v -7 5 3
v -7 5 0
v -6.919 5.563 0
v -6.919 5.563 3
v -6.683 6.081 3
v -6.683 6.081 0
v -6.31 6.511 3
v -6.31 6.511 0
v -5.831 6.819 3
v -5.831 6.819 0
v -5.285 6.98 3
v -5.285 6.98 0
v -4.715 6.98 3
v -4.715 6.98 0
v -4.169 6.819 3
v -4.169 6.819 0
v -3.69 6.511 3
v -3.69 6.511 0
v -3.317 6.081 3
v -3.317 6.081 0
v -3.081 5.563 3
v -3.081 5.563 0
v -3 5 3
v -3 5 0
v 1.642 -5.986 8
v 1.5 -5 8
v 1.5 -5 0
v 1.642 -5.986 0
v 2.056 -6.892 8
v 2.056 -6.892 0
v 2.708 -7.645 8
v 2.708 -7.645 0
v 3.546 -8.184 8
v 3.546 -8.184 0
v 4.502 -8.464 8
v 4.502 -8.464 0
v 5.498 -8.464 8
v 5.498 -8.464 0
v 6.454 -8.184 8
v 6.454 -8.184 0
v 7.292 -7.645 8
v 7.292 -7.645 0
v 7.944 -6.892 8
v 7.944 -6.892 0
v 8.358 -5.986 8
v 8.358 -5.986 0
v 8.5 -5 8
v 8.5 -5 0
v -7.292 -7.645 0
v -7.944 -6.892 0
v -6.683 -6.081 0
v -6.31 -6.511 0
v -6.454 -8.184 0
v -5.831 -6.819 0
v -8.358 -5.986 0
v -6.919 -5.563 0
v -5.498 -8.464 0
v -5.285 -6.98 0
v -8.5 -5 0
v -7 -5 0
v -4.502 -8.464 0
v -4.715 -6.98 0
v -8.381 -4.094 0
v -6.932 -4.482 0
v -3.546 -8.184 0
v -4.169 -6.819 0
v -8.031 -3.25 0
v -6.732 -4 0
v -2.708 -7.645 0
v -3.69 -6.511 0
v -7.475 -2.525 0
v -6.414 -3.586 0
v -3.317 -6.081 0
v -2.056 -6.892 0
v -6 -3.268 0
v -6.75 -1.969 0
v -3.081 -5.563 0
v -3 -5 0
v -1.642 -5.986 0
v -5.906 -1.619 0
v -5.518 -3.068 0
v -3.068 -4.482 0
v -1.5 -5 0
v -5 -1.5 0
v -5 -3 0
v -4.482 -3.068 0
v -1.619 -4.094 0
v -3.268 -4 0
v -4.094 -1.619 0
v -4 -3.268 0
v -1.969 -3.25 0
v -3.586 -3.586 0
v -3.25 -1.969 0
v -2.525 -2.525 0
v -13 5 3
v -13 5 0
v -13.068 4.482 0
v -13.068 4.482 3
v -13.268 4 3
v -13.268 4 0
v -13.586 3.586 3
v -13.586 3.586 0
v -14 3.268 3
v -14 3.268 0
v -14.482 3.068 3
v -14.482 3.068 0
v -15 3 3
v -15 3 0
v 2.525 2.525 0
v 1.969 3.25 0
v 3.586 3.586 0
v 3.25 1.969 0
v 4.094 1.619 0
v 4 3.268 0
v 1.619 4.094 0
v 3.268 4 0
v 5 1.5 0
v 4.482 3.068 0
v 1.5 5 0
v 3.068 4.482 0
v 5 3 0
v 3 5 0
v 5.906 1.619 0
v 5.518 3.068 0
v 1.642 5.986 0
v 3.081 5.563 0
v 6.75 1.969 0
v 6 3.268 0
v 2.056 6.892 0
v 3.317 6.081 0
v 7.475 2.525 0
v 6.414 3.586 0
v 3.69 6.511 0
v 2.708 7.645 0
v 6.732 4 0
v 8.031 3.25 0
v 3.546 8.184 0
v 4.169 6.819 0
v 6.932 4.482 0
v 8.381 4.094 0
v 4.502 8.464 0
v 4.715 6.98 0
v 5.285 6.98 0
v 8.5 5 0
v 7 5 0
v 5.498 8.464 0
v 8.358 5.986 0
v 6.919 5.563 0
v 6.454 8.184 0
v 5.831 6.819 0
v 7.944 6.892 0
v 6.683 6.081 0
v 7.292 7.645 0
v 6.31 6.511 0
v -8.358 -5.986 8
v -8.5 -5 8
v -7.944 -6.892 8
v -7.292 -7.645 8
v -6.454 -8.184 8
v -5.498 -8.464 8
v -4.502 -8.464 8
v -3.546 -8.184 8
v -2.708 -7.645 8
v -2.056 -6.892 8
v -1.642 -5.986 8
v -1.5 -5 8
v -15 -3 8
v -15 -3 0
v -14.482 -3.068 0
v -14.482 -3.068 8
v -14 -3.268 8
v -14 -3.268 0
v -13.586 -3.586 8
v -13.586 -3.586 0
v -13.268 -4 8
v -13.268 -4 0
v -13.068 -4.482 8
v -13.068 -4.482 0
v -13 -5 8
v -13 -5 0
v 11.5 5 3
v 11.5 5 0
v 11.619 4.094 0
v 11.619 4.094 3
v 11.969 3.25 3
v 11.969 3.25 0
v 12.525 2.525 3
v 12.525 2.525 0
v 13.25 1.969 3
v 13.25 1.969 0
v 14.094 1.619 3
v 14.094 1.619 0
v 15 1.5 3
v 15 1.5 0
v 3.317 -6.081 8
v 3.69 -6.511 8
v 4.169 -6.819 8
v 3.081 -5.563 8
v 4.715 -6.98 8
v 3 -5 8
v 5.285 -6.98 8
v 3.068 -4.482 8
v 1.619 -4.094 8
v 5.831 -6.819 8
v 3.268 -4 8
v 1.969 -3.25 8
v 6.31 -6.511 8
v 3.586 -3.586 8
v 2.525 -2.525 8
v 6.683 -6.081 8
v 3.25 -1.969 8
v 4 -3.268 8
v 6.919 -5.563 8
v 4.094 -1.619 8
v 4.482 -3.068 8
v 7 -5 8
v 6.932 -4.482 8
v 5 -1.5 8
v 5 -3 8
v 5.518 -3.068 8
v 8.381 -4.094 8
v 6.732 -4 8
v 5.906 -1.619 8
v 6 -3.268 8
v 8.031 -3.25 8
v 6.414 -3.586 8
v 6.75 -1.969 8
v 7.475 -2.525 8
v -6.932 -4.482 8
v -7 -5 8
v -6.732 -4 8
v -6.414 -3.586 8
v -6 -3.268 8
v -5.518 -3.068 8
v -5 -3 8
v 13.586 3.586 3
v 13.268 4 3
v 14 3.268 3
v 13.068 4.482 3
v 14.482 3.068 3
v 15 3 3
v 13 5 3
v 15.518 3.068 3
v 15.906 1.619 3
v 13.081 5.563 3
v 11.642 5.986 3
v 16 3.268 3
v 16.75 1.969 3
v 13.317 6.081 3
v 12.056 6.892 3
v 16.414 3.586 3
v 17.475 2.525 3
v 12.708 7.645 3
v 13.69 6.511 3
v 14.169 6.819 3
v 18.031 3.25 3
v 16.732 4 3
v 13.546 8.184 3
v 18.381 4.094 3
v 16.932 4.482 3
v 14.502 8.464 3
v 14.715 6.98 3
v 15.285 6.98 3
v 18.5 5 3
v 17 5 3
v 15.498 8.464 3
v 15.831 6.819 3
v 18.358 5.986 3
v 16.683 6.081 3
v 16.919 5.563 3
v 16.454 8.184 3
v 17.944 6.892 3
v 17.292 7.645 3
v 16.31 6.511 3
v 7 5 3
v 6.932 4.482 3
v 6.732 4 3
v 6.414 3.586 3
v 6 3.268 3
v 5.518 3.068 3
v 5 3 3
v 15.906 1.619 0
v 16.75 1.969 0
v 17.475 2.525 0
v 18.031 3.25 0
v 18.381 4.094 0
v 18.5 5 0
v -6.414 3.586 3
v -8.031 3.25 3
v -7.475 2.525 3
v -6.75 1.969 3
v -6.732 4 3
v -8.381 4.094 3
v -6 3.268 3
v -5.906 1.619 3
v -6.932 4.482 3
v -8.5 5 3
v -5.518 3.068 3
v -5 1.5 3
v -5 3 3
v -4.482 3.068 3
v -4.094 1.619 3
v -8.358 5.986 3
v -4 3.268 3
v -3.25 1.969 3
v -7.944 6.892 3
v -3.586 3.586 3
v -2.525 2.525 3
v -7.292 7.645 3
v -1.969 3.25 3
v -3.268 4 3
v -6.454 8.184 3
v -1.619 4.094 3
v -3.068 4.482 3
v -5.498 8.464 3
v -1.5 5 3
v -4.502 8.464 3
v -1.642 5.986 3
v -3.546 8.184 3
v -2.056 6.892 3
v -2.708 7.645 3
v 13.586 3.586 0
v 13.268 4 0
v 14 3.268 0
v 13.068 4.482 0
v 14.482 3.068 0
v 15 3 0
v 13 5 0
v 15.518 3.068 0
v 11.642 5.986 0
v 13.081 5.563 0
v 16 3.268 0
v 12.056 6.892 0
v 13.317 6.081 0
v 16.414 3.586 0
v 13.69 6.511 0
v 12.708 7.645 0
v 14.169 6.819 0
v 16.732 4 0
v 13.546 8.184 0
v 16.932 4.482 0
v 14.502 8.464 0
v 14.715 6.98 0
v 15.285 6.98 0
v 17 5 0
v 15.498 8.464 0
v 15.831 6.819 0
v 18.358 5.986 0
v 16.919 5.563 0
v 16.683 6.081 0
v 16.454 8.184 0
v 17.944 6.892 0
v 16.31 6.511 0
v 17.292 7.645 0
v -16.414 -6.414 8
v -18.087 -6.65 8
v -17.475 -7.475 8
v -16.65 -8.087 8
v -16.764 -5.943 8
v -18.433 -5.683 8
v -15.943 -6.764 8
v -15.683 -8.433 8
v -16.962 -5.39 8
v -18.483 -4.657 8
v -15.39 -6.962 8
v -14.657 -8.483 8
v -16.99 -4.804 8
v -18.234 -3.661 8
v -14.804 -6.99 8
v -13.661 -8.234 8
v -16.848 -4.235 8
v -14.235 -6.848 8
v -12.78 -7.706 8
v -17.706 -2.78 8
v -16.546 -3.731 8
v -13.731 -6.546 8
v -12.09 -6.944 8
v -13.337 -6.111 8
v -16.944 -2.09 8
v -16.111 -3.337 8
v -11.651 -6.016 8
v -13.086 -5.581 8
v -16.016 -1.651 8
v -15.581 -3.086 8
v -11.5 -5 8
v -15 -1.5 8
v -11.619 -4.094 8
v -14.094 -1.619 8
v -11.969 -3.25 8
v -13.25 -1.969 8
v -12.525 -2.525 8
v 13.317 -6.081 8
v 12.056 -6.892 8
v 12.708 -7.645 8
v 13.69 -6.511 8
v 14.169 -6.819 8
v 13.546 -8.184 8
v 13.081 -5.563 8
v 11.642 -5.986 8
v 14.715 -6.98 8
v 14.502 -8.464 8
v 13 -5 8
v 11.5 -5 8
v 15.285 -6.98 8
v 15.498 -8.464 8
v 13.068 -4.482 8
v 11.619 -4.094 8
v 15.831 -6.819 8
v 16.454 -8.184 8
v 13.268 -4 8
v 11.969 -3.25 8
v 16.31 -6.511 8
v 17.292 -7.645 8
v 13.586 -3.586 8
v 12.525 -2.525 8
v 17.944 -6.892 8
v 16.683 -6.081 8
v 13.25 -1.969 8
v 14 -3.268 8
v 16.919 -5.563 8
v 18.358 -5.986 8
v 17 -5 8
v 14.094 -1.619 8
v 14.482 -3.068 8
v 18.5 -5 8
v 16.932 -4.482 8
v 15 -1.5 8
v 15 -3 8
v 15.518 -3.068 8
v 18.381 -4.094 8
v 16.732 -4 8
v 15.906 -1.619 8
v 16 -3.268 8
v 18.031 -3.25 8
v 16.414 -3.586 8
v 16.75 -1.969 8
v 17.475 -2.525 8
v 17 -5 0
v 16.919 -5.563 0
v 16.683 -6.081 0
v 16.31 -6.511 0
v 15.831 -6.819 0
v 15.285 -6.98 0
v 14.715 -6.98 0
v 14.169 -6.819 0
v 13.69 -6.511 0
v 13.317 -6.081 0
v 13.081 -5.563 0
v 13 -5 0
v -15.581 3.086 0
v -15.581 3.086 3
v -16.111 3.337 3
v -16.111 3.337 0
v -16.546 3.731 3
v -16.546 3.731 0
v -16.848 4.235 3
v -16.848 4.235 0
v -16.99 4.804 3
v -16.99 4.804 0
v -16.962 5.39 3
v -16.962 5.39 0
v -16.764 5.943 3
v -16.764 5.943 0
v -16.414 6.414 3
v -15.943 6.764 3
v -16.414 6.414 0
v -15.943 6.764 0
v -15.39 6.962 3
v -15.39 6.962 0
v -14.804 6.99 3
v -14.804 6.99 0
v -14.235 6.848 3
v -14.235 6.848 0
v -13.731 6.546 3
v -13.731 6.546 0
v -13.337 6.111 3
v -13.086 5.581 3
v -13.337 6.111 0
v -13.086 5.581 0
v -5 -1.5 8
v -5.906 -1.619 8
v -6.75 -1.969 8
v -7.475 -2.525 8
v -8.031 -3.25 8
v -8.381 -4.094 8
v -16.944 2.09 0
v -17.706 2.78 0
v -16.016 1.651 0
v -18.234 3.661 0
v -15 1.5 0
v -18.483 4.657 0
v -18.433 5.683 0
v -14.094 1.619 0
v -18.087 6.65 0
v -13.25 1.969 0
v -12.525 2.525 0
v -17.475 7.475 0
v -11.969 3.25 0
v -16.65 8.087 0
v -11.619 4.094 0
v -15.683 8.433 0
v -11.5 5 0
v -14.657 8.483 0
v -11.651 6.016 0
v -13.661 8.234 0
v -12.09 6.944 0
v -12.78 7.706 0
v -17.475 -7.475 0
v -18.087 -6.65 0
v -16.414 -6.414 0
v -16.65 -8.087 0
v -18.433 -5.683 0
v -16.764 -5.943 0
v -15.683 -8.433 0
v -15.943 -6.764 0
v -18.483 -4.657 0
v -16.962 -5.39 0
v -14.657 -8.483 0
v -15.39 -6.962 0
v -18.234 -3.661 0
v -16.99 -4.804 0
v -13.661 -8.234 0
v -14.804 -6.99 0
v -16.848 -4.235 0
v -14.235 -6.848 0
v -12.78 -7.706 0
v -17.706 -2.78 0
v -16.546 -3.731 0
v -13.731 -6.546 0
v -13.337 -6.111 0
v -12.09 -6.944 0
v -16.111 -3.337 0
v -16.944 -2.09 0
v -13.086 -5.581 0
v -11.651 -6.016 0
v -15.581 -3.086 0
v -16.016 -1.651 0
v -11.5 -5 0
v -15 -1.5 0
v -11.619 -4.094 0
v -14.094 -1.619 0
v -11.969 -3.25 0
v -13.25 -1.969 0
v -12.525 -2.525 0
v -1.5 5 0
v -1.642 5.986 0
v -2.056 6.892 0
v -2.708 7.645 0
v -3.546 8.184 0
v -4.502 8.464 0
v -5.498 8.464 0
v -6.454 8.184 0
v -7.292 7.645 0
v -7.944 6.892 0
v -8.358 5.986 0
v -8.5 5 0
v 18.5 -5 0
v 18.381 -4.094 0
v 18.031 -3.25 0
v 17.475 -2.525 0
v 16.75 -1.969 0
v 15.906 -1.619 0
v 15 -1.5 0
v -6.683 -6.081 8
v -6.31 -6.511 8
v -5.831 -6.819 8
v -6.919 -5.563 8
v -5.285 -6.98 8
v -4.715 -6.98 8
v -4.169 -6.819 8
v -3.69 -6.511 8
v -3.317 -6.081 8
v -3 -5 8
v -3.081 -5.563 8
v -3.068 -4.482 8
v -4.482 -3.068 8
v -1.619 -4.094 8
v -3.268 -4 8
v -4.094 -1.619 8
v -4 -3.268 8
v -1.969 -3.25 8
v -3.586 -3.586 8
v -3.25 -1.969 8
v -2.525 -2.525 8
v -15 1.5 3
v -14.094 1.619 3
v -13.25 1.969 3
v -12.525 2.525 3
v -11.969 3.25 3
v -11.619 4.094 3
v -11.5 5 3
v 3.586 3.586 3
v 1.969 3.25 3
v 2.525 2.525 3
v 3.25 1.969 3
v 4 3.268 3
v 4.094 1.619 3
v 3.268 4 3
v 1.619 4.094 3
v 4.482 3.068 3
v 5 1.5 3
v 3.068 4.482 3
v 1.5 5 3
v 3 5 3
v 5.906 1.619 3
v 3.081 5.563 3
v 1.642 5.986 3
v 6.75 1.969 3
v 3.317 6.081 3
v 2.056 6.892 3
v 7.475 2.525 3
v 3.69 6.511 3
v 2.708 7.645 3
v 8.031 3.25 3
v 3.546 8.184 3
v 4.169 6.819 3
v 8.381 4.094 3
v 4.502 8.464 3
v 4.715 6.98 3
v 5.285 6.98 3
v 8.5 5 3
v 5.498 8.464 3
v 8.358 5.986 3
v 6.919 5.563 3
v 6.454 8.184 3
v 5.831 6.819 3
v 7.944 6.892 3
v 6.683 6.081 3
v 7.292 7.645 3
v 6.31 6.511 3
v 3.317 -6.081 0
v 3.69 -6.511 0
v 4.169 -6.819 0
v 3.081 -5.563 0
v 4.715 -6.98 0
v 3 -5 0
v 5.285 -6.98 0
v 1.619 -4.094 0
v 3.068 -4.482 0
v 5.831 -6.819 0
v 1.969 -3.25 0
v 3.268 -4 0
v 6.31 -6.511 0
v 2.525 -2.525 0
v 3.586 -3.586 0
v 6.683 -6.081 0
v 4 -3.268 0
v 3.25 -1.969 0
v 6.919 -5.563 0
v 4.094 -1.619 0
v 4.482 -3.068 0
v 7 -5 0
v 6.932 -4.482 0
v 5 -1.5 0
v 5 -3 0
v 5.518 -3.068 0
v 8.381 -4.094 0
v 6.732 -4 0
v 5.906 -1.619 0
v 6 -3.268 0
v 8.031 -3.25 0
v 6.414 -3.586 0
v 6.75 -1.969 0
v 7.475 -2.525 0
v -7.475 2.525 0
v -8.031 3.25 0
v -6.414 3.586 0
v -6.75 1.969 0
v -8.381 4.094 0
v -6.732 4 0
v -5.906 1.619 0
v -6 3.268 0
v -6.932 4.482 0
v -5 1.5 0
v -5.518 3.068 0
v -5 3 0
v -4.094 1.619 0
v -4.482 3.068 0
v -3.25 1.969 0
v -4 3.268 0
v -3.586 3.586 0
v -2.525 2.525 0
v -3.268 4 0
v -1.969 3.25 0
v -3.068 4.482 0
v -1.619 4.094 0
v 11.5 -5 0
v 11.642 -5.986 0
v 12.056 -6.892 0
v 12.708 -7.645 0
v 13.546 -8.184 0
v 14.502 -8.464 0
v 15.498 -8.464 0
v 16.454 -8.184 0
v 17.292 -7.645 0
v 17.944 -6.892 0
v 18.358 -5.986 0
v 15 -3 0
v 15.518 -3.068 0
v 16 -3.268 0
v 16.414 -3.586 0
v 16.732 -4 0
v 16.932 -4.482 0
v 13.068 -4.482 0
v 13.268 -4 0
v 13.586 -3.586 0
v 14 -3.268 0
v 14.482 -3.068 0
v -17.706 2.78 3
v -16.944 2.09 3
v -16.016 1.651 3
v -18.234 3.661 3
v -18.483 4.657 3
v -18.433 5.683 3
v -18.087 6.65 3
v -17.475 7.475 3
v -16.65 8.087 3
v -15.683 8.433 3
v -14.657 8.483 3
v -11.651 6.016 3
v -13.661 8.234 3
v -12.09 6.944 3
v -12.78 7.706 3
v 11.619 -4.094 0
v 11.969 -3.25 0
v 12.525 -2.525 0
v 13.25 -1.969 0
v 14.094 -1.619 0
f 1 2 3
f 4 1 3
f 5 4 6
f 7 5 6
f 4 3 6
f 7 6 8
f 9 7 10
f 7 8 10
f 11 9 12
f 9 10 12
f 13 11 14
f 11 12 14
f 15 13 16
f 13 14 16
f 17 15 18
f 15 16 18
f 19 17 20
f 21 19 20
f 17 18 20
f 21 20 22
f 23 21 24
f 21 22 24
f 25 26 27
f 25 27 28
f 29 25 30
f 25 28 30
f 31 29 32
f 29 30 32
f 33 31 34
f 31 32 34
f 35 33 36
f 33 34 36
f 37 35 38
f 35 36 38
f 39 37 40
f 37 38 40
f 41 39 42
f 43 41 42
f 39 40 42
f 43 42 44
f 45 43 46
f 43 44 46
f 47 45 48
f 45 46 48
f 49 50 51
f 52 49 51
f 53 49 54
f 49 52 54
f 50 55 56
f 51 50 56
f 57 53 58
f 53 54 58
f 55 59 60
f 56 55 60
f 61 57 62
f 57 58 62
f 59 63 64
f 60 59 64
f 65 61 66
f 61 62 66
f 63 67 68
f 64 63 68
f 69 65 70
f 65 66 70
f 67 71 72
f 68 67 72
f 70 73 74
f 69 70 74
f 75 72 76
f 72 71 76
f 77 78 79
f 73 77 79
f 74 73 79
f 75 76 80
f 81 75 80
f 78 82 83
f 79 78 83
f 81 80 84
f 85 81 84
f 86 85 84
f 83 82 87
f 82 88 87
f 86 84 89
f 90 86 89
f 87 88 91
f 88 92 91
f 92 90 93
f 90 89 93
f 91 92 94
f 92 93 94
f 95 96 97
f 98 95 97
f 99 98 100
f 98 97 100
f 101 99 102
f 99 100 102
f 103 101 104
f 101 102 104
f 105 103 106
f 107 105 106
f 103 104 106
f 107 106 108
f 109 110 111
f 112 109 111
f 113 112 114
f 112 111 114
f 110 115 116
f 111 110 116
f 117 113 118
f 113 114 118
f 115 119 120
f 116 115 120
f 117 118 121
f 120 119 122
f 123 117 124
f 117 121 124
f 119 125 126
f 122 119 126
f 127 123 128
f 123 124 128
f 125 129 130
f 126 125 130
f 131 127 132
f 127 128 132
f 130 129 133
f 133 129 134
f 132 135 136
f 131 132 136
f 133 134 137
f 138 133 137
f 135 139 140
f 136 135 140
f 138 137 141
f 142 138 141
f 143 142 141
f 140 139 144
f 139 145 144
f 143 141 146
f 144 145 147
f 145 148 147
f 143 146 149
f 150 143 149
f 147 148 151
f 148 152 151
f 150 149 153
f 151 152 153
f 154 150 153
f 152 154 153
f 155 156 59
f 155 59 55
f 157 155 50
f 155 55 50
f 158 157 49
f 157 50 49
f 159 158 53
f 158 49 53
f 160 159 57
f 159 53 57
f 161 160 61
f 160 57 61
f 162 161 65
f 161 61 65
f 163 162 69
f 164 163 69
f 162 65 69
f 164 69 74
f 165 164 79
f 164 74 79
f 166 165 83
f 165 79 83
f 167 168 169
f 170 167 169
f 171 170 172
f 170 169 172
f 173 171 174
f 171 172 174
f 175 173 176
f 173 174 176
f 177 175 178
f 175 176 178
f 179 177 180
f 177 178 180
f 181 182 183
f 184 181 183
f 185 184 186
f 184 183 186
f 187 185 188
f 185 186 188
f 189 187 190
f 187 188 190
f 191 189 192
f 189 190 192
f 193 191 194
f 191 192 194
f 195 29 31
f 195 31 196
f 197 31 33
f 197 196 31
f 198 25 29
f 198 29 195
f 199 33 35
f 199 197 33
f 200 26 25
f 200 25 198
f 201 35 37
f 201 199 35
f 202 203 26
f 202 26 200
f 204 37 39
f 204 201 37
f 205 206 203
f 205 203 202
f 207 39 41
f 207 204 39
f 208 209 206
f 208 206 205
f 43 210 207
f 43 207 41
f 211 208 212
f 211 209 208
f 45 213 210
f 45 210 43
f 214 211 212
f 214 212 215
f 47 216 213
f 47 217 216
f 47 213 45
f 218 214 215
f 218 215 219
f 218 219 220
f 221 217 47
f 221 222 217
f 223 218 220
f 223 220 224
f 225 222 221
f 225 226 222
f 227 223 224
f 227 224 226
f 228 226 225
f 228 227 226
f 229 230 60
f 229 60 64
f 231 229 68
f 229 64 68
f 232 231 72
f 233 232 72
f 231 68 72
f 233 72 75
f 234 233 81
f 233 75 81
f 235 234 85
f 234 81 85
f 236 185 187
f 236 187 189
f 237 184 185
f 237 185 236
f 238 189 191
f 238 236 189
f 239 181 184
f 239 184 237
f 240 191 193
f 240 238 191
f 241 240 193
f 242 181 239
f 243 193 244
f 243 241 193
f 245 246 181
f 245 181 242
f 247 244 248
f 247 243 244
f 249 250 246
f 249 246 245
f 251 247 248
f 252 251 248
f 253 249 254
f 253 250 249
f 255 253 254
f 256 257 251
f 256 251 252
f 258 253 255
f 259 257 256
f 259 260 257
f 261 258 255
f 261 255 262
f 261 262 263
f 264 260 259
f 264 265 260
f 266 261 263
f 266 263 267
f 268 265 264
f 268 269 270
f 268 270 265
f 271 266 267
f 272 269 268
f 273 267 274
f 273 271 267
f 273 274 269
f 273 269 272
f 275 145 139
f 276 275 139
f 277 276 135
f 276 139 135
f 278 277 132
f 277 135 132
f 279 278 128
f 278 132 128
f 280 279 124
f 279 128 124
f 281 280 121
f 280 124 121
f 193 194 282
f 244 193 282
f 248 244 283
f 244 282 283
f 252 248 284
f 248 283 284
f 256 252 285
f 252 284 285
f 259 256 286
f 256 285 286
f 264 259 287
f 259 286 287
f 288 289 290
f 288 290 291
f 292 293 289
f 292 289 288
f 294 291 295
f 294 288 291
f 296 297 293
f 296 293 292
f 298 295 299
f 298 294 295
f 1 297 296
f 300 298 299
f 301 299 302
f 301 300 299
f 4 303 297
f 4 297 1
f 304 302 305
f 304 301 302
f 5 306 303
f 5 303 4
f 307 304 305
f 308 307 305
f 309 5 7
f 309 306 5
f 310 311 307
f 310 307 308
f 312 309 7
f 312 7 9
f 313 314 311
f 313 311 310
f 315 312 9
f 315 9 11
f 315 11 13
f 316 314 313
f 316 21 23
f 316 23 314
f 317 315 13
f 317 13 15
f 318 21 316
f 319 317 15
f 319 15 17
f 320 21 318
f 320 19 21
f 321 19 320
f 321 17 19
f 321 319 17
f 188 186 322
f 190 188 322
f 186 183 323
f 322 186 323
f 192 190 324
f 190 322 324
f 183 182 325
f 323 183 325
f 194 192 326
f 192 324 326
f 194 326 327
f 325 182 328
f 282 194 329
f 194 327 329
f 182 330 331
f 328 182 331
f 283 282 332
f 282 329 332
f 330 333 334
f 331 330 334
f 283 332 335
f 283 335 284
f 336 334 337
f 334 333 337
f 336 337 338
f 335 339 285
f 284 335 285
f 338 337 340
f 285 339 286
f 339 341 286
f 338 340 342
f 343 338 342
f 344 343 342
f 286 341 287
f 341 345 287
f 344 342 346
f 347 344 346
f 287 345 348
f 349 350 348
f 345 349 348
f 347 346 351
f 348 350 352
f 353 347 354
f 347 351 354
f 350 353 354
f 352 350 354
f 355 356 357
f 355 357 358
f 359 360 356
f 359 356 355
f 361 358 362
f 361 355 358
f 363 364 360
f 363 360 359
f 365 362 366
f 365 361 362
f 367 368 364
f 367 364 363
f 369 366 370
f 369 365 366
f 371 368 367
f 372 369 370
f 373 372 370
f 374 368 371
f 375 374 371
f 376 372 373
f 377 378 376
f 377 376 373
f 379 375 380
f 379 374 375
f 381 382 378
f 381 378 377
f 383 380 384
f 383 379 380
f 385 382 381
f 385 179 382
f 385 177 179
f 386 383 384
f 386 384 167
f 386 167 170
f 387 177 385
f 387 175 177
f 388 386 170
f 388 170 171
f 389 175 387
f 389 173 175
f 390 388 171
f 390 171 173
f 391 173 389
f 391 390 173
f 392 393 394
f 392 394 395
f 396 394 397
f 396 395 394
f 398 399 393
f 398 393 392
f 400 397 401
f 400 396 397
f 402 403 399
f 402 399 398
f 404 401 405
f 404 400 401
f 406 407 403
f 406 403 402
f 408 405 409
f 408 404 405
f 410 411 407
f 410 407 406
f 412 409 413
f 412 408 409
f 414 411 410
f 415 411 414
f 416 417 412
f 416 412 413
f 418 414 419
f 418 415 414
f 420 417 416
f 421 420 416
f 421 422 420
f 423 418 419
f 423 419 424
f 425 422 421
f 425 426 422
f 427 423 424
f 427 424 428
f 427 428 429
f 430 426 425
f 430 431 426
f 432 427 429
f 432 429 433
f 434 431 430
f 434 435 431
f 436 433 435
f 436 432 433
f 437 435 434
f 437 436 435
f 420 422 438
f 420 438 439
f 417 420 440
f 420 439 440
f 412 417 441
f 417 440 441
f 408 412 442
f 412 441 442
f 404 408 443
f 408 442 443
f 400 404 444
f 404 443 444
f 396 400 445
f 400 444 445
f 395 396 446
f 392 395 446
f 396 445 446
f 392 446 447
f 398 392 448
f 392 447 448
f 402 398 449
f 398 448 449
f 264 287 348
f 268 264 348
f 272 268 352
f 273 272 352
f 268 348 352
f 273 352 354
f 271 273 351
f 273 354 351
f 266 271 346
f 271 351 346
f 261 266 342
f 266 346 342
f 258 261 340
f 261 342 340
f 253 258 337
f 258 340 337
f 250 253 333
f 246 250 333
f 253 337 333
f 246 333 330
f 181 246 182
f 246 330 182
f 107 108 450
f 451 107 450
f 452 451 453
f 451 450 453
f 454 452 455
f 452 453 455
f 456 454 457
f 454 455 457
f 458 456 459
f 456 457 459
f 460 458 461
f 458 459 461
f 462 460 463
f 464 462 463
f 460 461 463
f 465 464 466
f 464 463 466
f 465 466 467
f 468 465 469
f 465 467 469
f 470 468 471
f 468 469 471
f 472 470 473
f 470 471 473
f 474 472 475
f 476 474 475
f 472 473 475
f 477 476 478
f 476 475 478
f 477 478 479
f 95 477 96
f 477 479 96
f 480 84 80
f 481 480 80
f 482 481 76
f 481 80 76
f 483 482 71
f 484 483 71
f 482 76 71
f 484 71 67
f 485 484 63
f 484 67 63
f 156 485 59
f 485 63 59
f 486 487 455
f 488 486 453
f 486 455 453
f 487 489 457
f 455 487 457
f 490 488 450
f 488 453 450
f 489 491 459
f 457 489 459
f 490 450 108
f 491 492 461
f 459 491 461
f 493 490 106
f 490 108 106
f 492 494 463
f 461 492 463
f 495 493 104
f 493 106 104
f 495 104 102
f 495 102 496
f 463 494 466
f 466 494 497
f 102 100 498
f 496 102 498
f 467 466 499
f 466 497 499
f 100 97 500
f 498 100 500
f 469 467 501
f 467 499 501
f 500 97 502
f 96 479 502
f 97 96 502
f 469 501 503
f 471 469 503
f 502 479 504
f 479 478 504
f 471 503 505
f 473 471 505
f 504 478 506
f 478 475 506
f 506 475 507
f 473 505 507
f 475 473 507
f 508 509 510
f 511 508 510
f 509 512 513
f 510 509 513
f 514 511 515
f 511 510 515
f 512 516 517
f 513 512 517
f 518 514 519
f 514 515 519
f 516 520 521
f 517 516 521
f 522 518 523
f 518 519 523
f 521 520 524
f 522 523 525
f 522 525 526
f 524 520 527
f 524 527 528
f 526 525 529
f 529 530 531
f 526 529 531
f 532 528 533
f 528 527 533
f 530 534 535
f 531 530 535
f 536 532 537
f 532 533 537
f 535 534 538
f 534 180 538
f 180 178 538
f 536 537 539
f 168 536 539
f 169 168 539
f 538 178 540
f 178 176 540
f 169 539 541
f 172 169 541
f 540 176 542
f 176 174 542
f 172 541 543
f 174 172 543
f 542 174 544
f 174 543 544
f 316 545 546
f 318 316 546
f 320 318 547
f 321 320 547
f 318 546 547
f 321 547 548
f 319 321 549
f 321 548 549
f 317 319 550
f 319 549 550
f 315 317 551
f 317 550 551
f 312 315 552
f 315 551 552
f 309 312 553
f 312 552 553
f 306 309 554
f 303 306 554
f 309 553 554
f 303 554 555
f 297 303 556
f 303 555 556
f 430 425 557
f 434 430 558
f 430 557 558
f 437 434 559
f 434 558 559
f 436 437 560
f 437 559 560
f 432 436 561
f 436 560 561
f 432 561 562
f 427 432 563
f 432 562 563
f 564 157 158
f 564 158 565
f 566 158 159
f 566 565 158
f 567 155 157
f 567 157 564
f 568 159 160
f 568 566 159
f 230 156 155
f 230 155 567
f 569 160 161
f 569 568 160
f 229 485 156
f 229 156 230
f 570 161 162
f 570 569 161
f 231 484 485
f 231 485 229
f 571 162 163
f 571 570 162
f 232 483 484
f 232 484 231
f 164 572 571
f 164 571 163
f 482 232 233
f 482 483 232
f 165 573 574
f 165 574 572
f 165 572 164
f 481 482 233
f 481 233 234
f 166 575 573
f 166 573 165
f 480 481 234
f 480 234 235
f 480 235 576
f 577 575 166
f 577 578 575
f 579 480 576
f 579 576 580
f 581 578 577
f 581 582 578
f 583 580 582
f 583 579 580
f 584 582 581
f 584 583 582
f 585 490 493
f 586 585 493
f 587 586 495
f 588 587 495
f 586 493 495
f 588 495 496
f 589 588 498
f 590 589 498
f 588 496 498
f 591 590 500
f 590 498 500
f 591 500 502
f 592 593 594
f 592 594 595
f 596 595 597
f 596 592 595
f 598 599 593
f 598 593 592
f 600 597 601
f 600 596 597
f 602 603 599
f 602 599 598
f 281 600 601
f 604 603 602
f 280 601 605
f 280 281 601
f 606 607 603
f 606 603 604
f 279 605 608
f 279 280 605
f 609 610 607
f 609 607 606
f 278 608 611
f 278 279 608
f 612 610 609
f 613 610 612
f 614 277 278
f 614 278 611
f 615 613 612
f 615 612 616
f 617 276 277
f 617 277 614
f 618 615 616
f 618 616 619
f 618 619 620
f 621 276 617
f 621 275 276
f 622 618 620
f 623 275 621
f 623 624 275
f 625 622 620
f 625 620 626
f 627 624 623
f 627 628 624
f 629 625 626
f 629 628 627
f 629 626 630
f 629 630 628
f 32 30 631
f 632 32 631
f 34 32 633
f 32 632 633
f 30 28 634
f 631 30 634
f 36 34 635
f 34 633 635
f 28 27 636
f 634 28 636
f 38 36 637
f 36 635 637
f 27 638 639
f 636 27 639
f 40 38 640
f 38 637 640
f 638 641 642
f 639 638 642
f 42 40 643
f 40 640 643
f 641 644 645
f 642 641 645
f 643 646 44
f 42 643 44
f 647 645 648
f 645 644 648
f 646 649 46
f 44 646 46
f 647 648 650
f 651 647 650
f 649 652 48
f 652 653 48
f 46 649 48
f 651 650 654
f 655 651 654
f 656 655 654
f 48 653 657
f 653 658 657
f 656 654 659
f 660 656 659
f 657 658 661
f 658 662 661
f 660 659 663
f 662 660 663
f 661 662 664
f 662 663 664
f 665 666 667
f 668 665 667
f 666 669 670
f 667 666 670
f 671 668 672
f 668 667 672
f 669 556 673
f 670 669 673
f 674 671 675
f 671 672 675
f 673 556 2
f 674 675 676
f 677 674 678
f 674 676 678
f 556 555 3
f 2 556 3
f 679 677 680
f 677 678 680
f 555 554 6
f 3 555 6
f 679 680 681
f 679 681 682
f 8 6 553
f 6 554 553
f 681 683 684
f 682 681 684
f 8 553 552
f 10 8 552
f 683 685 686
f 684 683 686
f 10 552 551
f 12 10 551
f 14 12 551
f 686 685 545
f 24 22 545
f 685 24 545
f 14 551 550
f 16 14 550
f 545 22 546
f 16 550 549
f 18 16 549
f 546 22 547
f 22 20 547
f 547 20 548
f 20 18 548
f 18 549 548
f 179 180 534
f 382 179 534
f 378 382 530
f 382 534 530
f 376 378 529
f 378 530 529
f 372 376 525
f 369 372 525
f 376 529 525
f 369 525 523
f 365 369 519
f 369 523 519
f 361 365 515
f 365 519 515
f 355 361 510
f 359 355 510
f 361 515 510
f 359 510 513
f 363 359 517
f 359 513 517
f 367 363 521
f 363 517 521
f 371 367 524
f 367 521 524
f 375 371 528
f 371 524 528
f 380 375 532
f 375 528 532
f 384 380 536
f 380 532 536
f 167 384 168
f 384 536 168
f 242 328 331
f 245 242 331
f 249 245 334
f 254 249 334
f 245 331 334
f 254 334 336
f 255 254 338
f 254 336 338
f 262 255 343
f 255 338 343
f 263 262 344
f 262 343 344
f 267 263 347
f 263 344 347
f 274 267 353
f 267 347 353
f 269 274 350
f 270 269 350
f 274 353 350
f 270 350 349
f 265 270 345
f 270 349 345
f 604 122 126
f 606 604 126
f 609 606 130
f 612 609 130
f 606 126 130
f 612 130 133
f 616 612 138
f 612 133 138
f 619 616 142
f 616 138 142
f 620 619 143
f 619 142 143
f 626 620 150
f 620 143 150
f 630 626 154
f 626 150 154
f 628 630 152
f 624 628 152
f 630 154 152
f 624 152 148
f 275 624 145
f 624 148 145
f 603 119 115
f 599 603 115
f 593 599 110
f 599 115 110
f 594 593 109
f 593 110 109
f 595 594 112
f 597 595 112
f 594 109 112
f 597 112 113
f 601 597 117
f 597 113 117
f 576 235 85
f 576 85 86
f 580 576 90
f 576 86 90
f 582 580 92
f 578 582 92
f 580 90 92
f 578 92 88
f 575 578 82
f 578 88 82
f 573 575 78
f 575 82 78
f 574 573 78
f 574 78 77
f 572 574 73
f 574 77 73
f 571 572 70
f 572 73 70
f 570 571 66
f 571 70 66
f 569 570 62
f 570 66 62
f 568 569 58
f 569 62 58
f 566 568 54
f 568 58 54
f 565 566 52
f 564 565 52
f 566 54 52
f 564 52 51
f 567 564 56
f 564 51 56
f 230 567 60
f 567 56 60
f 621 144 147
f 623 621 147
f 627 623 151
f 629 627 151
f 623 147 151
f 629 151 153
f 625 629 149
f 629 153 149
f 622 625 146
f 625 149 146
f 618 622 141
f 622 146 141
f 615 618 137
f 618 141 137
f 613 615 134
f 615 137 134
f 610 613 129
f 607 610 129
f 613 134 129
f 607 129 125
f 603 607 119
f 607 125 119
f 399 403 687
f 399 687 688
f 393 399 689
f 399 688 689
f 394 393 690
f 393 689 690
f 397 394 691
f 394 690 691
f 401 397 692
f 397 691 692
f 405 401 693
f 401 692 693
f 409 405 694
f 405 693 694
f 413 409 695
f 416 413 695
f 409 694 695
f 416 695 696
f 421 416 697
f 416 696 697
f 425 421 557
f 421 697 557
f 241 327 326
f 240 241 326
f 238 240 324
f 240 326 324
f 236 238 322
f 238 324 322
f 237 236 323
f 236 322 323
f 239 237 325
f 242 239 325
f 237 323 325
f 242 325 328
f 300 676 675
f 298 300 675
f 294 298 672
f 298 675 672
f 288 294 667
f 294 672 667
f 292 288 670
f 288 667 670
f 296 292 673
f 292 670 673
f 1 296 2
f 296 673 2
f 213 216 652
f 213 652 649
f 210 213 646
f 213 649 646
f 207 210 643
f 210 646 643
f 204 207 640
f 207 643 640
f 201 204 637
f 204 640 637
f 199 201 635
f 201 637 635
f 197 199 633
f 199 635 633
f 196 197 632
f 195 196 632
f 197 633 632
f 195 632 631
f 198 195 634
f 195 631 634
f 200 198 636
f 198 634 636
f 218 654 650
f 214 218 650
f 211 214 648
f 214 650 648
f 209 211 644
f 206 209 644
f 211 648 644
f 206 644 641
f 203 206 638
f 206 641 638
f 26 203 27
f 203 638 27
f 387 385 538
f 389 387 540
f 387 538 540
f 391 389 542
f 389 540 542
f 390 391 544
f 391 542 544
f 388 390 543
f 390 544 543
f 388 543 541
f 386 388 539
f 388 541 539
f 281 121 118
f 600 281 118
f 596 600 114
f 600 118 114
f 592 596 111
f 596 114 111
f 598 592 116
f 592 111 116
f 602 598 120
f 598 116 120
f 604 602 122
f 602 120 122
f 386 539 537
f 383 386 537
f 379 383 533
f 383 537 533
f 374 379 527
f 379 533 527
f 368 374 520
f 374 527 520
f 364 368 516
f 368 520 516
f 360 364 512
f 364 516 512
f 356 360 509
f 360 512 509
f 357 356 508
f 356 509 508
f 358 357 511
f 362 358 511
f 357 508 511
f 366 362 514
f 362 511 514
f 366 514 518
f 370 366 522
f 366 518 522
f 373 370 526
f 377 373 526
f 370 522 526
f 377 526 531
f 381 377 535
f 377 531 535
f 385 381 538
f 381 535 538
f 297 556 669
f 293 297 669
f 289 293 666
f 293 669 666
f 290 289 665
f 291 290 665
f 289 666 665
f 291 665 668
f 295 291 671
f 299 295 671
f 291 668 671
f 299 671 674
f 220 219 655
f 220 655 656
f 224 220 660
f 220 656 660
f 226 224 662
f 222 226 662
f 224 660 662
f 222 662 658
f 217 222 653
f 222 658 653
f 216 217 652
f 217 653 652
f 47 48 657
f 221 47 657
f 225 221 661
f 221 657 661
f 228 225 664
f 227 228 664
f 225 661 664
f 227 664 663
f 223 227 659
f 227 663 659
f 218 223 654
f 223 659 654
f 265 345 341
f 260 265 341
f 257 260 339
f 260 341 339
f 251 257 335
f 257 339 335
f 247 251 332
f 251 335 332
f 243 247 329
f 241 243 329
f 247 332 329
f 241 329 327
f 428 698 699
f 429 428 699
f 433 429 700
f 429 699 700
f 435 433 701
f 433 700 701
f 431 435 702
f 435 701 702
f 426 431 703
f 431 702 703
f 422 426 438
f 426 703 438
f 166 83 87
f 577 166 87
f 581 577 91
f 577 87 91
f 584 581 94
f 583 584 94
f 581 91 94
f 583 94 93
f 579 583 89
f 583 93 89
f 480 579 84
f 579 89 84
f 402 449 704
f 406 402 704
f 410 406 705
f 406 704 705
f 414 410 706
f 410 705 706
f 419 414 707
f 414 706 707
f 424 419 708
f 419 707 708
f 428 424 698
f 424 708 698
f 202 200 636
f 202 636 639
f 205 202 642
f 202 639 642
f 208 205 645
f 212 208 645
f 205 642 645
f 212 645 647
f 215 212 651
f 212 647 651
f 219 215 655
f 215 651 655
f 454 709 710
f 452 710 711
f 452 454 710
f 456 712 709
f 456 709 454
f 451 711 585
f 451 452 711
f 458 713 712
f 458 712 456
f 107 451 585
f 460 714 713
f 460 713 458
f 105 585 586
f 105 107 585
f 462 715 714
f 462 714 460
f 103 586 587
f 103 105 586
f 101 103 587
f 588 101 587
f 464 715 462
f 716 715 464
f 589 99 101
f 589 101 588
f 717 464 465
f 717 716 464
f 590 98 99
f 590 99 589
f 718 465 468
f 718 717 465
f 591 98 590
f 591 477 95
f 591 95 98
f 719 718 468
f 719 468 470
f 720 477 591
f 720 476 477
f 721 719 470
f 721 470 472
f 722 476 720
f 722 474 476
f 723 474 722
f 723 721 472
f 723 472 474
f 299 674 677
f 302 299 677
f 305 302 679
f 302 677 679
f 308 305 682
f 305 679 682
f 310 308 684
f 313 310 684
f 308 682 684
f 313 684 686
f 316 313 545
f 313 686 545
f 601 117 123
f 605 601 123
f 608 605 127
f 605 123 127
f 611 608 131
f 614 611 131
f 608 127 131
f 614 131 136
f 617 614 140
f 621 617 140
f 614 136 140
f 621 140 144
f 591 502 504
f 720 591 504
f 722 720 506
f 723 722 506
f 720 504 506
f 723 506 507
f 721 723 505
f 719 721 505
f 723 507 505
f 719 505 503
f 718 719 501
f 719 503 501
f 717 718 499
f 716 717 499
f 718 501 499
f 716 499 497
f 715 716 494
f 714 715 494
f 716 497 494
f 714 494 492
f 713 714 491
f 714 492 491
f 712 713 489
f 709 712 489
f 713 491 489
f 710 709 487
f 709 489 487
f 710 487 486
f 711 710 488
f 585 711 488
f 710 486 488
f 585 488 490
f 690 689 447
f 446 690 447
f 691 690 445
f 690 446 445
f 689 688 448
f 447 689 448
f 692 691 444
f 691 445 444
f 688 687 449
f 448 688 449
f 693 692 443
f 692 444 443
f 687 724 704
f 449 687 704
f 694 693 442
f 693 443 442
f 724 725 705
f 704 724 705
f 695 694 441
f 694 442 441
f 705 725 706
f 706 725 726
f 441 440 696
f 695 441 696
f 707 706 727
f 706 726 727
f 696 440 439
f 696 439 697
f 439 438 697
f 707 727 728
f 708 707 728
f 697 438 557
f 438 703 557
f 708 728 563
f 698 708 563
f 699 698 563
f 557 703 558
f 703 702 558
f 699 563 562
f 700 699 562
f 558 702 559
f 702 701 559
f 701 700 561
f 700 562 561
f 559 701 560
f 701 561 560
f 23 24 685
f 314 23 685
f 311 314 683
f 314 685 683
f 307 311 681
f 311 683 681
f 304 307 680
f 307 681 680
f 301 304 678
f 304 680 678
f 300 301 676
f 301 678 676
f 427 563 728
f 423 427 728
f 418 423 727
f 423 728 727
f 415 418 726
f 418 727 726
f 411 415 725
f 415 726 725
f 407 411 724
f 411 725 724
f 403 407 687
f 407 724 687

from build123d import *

# Parameters (mm, degrees)
F1_DEPTH = 3
F2_DEPTH = 8


with BuildPart() as f1:
    # F0 (on Top) → F1 (new body)
    with BuildSketch(Plane.XY):
        with BuildLine():
            Line((-13, 5), (-11.5, 5))
            ThreePointArc((-11.5, 5), (-17.4748737342, 7.4748737342), (-15, 1.5))
            Line((-15, 1.5), (-15, 3))
            ThreePointArc((-15, 3), (-16.4142135624, 6.4142135624), (-13, 5))
        make_face()
        with BuildLine():
            ThreePointArc((-15, 1.5), (-12.5251262658, 2.5251262658), (-11.5, 5))
            Line((-11.5, 5), (-13, 5))
            ThreePointArc((-13, 5), (-13.5857864376, 3.5857864376), (-15, 3))
            Line((-15, 3), (-15, 1.5))
        make_face()
    extrude(amount=F1_DEPTH)


with BuildPart() as f1b:
    # F0 (on Top) → F1, piece 2 (new body)
    with BuildSketch(Plane.XY):
        with BuildLine():
            ThreePointArc((-1.5, 5), (-5, 8.5), (-8.5, 5))
            Line((-8.5, 5), (-7, 5))
            ThreePointArc((-7, 5), (-5, 7), (-3, 5))
            Line((-3, 5), (-1.5, 5))
        make_face()
        with BuildLine():
            Line((-5, 3), (-5, 1.5))
            ThreePointArc((-5, 1.5), (-2.5251262658, 2.5251262658), (-1.5, 5))
            Line((-1.5, 5), (-3, 5))
            ThreePointArc((-3, 5), (-3.5857864376, 3.5857864376), (-5, 3))
        make_face()
        with BuildLine():
            ThreePointArc((-8.5, 5), (-7.4748737342, 2.5251262658), (-5, 1.5))
            Line((-5, 1.5), (-5, 3))
            ThreePointArc((-5, 3), (-6.4142135624, 3.5857864376), (-7, 5))
            Line((-7, 5), (-8.5, 5))
        make_face()
    extrude(amount=F1_DEPTH)


with BuildPart() as f1c:
    # F0 (on Top) → F1, piece 3 (new body)
    with BuildSketch(Plane.XY):
        with BuildLine():
            ThreePointArc((1.5, 5), (2.5251262658, 2.5251262658), (5, 1.5))
            Line((5, 1.5), (5, 3))
            ThreePointArc((5, 3), (3.5857864376, 3.5857864376), (3, 5))
            Line((3, 5), (1.5, 5))
        make_face()
        with BuildLine():
            Line((5, 3), (5, 1.5))
            ThreePointArc((5, 1.5), (7.4748737342, 2.5251262658), (8.5, 5))
            Line((8.5, 5), (7, 5))
            ThreePointArc((7, 5), (6.4142135624, 3.5857864376), (5, 3))
        make_face()
        with BuildLine():
            ThreePointArc((8.5, 5), (5, 8.5), (1.5, 5))
            Line((1.5, 5), (3, 5))
            ThreePointArc((3, 5), (5, 7), (7, 5))
            Line((7, 5), (8.5, 5))
        make_face()
    extrude(amount=F1_DEPTH)


with BuildPart() as f1d:
    # F0 (on Top) → F1, piece 4 (new body)
    with BuildSketch(Plane.XY):
        with BuildLine():
            ThreePointArc((18.5, 5), (15, 8.5), (11.5, 5))
            Line((11.5, 5), (13, 5))
            ThreePointArc((13, 5), (15, 7), (17, 5))
            ThreePointArc((17, 5), (16.4142135624, 3.5857864376), (15, 3))
            Line((15, 3), (15, 1.5))
            ThreePointArc((15, 1.5), (17.4748737342, 2.5251262658), (18.5, 5))
        make_face()
        with BuildLine():
            Line((13, 5), (11.5, 5))
            ThreePointArc((11.5, 5), (12.5251262658, 2.5251262658), (15, 1.5))
            Line((15, 1.5), (15, 3))
            ThreePointArc((15, 3), (13.5857864376, 3.5857864376), (13, 5))
        make_face()
    extrude(amount=F1_DEPTH)


with BuildPart() as f2:
    # F0 (on Top) → F2 (new body)
    with BuildSketch(Plane.XY):
        with BuildLine():
            ThreePointArc((-15, -1.5), (-17.4748737342, -7.4748737342), (-11.5, -5))
            Line((-11.5, -5), (-13, -5))
            ThreePointArc((-13, -5), (-16.4142135624, -6.4142135624), (-15, -3))
            Line((-15, -3), (-15, -1.5))
        make_face()
        with BuildLine():
            Line((-13, -5), (-11.5, -5))
            ThreePointArc((-11.5, -5), (-12.5251262658, -2.5251262658), (-15, -1.5))
            Line((-15, -1.5), (-15, -3))
            ThreePointArc((-15, -3), (-13.5857864376, -3.5857864376), (-13, -5))
        make_face()
    extrude(amount=F2_DEPTH)


with BuildPart() as f2b:
    # F0 (on Top) → F2, piece 2 (new body)
    with BuildSketch(Plane.XY):
        with BuildLine():
            ThreePointArc((-7, -5), (-6.4142135624, -3.5857864376), (-5, -3))
            Line((-5, -3), (-5, -1.5))
            ThreePointArc((-5, -1.5), (-7.4748737342, -2.5251262658), (-8.5, -5))
            Line((-8.5, -5), (-7, -5))
        make_face()
        with BuildLine():
            ThreePointArc((-5, -3), (-3.5857864376, -3.5857864376), (-3, -5))
            Line((-3, -5), (-1.5, -5))
            ThreePointArc((-1.5, -5), (-2.5251262658, -2.5251262658), (-5, -1.5))
            Line((-5, -1.5), (-5, -3))
        make_face()
        with BuildLine():
            Line((-1.5, -5), (-3, -5))
            ThreePointArc((-3, -5), (-5, -7), (-7, -5))
            Line((-7, -5), (-8.5, -5))
            ThreePointArc((-8.5, -5), (-5, -8.5), (-1.5, -5))
        make_face()
    extrude(amount=F2_DEPTH)


with BuildPart() as f2c:
    # F0 (on Top) → F2, piece 3 (new body)
    with BuildSketch(Plane.XY):
        with BuildLine():
            ThreePointArc((5, -1.5), (2.5251262658, -2.5251262658), (1.5, -5))
            Line((1.5, -5), (3, -5))
            ThreePointArc((3, -5), (3.5857864376, -3.5857864376), (5, -3))
            Line((5, -3), (5, -1.5))
        make_face()
        with BuildLine():
            Line((3, -5), (1.5, -5))
            ThreePointArc((1.5, -5), (5, -8.5), (8.5, -5))
            Line((8.5, -5), (7, -5))
            ThreePointArc((7, -5), (5, -7), (3, -5))
        make_face()
        with BuildLine():
            ThreePointArc((8.5, -5), (7.4748737342, -2.5251262658), (5, -1.5))
            Line((5, -1.5), (5, -3))
            ThreePointArc((5, -3), (6.4142135624, -3.5857864376), (7, -5))
            Line((7, -5), (8.5, -5))
        make_face()
    extrude(amount=F2_DEPTH)


with BuildPart() as f2d:
    # F0 (on Top) → F2, piece 4 (new body)
    with BuildSketch(Plane.XY):
        with BuildLine():
            ThreePointArc((15, -1.5), (12.5251262658, -2.5251262658), (11.5, -5))
            Line((11.5, -5), (13, -5))
            ThreePointArc((13, -5), (13.5857864376, -3.5857864376), (15, -3))
            Line((15, -3), (15, -1.5))
        make_face()
        with BuildLine():
            Line((13, -5), (11.5, -5))
            ThreePointArc((11.5, -5), (15, -8.5), (18.5, -5))
            ThreePointArc((18.5, -5), (17.4748737342, -2.5251262658), (15, -1.5))
            Line((15, -1.5), (15, -3))
            ThreePointArc((15, -3), (16.4142135624, -3.5857864376), (17, -5))
            ThreePointArc((17, -5), (15, -7), (13, -5))
        make_face()
    extrude(amount=F2_DEPTH)


solid = Compound([f1.part, f1b.part, f1c.part, f1d.part, f2.part, f2b.part, f2c.part, f2d.part])
